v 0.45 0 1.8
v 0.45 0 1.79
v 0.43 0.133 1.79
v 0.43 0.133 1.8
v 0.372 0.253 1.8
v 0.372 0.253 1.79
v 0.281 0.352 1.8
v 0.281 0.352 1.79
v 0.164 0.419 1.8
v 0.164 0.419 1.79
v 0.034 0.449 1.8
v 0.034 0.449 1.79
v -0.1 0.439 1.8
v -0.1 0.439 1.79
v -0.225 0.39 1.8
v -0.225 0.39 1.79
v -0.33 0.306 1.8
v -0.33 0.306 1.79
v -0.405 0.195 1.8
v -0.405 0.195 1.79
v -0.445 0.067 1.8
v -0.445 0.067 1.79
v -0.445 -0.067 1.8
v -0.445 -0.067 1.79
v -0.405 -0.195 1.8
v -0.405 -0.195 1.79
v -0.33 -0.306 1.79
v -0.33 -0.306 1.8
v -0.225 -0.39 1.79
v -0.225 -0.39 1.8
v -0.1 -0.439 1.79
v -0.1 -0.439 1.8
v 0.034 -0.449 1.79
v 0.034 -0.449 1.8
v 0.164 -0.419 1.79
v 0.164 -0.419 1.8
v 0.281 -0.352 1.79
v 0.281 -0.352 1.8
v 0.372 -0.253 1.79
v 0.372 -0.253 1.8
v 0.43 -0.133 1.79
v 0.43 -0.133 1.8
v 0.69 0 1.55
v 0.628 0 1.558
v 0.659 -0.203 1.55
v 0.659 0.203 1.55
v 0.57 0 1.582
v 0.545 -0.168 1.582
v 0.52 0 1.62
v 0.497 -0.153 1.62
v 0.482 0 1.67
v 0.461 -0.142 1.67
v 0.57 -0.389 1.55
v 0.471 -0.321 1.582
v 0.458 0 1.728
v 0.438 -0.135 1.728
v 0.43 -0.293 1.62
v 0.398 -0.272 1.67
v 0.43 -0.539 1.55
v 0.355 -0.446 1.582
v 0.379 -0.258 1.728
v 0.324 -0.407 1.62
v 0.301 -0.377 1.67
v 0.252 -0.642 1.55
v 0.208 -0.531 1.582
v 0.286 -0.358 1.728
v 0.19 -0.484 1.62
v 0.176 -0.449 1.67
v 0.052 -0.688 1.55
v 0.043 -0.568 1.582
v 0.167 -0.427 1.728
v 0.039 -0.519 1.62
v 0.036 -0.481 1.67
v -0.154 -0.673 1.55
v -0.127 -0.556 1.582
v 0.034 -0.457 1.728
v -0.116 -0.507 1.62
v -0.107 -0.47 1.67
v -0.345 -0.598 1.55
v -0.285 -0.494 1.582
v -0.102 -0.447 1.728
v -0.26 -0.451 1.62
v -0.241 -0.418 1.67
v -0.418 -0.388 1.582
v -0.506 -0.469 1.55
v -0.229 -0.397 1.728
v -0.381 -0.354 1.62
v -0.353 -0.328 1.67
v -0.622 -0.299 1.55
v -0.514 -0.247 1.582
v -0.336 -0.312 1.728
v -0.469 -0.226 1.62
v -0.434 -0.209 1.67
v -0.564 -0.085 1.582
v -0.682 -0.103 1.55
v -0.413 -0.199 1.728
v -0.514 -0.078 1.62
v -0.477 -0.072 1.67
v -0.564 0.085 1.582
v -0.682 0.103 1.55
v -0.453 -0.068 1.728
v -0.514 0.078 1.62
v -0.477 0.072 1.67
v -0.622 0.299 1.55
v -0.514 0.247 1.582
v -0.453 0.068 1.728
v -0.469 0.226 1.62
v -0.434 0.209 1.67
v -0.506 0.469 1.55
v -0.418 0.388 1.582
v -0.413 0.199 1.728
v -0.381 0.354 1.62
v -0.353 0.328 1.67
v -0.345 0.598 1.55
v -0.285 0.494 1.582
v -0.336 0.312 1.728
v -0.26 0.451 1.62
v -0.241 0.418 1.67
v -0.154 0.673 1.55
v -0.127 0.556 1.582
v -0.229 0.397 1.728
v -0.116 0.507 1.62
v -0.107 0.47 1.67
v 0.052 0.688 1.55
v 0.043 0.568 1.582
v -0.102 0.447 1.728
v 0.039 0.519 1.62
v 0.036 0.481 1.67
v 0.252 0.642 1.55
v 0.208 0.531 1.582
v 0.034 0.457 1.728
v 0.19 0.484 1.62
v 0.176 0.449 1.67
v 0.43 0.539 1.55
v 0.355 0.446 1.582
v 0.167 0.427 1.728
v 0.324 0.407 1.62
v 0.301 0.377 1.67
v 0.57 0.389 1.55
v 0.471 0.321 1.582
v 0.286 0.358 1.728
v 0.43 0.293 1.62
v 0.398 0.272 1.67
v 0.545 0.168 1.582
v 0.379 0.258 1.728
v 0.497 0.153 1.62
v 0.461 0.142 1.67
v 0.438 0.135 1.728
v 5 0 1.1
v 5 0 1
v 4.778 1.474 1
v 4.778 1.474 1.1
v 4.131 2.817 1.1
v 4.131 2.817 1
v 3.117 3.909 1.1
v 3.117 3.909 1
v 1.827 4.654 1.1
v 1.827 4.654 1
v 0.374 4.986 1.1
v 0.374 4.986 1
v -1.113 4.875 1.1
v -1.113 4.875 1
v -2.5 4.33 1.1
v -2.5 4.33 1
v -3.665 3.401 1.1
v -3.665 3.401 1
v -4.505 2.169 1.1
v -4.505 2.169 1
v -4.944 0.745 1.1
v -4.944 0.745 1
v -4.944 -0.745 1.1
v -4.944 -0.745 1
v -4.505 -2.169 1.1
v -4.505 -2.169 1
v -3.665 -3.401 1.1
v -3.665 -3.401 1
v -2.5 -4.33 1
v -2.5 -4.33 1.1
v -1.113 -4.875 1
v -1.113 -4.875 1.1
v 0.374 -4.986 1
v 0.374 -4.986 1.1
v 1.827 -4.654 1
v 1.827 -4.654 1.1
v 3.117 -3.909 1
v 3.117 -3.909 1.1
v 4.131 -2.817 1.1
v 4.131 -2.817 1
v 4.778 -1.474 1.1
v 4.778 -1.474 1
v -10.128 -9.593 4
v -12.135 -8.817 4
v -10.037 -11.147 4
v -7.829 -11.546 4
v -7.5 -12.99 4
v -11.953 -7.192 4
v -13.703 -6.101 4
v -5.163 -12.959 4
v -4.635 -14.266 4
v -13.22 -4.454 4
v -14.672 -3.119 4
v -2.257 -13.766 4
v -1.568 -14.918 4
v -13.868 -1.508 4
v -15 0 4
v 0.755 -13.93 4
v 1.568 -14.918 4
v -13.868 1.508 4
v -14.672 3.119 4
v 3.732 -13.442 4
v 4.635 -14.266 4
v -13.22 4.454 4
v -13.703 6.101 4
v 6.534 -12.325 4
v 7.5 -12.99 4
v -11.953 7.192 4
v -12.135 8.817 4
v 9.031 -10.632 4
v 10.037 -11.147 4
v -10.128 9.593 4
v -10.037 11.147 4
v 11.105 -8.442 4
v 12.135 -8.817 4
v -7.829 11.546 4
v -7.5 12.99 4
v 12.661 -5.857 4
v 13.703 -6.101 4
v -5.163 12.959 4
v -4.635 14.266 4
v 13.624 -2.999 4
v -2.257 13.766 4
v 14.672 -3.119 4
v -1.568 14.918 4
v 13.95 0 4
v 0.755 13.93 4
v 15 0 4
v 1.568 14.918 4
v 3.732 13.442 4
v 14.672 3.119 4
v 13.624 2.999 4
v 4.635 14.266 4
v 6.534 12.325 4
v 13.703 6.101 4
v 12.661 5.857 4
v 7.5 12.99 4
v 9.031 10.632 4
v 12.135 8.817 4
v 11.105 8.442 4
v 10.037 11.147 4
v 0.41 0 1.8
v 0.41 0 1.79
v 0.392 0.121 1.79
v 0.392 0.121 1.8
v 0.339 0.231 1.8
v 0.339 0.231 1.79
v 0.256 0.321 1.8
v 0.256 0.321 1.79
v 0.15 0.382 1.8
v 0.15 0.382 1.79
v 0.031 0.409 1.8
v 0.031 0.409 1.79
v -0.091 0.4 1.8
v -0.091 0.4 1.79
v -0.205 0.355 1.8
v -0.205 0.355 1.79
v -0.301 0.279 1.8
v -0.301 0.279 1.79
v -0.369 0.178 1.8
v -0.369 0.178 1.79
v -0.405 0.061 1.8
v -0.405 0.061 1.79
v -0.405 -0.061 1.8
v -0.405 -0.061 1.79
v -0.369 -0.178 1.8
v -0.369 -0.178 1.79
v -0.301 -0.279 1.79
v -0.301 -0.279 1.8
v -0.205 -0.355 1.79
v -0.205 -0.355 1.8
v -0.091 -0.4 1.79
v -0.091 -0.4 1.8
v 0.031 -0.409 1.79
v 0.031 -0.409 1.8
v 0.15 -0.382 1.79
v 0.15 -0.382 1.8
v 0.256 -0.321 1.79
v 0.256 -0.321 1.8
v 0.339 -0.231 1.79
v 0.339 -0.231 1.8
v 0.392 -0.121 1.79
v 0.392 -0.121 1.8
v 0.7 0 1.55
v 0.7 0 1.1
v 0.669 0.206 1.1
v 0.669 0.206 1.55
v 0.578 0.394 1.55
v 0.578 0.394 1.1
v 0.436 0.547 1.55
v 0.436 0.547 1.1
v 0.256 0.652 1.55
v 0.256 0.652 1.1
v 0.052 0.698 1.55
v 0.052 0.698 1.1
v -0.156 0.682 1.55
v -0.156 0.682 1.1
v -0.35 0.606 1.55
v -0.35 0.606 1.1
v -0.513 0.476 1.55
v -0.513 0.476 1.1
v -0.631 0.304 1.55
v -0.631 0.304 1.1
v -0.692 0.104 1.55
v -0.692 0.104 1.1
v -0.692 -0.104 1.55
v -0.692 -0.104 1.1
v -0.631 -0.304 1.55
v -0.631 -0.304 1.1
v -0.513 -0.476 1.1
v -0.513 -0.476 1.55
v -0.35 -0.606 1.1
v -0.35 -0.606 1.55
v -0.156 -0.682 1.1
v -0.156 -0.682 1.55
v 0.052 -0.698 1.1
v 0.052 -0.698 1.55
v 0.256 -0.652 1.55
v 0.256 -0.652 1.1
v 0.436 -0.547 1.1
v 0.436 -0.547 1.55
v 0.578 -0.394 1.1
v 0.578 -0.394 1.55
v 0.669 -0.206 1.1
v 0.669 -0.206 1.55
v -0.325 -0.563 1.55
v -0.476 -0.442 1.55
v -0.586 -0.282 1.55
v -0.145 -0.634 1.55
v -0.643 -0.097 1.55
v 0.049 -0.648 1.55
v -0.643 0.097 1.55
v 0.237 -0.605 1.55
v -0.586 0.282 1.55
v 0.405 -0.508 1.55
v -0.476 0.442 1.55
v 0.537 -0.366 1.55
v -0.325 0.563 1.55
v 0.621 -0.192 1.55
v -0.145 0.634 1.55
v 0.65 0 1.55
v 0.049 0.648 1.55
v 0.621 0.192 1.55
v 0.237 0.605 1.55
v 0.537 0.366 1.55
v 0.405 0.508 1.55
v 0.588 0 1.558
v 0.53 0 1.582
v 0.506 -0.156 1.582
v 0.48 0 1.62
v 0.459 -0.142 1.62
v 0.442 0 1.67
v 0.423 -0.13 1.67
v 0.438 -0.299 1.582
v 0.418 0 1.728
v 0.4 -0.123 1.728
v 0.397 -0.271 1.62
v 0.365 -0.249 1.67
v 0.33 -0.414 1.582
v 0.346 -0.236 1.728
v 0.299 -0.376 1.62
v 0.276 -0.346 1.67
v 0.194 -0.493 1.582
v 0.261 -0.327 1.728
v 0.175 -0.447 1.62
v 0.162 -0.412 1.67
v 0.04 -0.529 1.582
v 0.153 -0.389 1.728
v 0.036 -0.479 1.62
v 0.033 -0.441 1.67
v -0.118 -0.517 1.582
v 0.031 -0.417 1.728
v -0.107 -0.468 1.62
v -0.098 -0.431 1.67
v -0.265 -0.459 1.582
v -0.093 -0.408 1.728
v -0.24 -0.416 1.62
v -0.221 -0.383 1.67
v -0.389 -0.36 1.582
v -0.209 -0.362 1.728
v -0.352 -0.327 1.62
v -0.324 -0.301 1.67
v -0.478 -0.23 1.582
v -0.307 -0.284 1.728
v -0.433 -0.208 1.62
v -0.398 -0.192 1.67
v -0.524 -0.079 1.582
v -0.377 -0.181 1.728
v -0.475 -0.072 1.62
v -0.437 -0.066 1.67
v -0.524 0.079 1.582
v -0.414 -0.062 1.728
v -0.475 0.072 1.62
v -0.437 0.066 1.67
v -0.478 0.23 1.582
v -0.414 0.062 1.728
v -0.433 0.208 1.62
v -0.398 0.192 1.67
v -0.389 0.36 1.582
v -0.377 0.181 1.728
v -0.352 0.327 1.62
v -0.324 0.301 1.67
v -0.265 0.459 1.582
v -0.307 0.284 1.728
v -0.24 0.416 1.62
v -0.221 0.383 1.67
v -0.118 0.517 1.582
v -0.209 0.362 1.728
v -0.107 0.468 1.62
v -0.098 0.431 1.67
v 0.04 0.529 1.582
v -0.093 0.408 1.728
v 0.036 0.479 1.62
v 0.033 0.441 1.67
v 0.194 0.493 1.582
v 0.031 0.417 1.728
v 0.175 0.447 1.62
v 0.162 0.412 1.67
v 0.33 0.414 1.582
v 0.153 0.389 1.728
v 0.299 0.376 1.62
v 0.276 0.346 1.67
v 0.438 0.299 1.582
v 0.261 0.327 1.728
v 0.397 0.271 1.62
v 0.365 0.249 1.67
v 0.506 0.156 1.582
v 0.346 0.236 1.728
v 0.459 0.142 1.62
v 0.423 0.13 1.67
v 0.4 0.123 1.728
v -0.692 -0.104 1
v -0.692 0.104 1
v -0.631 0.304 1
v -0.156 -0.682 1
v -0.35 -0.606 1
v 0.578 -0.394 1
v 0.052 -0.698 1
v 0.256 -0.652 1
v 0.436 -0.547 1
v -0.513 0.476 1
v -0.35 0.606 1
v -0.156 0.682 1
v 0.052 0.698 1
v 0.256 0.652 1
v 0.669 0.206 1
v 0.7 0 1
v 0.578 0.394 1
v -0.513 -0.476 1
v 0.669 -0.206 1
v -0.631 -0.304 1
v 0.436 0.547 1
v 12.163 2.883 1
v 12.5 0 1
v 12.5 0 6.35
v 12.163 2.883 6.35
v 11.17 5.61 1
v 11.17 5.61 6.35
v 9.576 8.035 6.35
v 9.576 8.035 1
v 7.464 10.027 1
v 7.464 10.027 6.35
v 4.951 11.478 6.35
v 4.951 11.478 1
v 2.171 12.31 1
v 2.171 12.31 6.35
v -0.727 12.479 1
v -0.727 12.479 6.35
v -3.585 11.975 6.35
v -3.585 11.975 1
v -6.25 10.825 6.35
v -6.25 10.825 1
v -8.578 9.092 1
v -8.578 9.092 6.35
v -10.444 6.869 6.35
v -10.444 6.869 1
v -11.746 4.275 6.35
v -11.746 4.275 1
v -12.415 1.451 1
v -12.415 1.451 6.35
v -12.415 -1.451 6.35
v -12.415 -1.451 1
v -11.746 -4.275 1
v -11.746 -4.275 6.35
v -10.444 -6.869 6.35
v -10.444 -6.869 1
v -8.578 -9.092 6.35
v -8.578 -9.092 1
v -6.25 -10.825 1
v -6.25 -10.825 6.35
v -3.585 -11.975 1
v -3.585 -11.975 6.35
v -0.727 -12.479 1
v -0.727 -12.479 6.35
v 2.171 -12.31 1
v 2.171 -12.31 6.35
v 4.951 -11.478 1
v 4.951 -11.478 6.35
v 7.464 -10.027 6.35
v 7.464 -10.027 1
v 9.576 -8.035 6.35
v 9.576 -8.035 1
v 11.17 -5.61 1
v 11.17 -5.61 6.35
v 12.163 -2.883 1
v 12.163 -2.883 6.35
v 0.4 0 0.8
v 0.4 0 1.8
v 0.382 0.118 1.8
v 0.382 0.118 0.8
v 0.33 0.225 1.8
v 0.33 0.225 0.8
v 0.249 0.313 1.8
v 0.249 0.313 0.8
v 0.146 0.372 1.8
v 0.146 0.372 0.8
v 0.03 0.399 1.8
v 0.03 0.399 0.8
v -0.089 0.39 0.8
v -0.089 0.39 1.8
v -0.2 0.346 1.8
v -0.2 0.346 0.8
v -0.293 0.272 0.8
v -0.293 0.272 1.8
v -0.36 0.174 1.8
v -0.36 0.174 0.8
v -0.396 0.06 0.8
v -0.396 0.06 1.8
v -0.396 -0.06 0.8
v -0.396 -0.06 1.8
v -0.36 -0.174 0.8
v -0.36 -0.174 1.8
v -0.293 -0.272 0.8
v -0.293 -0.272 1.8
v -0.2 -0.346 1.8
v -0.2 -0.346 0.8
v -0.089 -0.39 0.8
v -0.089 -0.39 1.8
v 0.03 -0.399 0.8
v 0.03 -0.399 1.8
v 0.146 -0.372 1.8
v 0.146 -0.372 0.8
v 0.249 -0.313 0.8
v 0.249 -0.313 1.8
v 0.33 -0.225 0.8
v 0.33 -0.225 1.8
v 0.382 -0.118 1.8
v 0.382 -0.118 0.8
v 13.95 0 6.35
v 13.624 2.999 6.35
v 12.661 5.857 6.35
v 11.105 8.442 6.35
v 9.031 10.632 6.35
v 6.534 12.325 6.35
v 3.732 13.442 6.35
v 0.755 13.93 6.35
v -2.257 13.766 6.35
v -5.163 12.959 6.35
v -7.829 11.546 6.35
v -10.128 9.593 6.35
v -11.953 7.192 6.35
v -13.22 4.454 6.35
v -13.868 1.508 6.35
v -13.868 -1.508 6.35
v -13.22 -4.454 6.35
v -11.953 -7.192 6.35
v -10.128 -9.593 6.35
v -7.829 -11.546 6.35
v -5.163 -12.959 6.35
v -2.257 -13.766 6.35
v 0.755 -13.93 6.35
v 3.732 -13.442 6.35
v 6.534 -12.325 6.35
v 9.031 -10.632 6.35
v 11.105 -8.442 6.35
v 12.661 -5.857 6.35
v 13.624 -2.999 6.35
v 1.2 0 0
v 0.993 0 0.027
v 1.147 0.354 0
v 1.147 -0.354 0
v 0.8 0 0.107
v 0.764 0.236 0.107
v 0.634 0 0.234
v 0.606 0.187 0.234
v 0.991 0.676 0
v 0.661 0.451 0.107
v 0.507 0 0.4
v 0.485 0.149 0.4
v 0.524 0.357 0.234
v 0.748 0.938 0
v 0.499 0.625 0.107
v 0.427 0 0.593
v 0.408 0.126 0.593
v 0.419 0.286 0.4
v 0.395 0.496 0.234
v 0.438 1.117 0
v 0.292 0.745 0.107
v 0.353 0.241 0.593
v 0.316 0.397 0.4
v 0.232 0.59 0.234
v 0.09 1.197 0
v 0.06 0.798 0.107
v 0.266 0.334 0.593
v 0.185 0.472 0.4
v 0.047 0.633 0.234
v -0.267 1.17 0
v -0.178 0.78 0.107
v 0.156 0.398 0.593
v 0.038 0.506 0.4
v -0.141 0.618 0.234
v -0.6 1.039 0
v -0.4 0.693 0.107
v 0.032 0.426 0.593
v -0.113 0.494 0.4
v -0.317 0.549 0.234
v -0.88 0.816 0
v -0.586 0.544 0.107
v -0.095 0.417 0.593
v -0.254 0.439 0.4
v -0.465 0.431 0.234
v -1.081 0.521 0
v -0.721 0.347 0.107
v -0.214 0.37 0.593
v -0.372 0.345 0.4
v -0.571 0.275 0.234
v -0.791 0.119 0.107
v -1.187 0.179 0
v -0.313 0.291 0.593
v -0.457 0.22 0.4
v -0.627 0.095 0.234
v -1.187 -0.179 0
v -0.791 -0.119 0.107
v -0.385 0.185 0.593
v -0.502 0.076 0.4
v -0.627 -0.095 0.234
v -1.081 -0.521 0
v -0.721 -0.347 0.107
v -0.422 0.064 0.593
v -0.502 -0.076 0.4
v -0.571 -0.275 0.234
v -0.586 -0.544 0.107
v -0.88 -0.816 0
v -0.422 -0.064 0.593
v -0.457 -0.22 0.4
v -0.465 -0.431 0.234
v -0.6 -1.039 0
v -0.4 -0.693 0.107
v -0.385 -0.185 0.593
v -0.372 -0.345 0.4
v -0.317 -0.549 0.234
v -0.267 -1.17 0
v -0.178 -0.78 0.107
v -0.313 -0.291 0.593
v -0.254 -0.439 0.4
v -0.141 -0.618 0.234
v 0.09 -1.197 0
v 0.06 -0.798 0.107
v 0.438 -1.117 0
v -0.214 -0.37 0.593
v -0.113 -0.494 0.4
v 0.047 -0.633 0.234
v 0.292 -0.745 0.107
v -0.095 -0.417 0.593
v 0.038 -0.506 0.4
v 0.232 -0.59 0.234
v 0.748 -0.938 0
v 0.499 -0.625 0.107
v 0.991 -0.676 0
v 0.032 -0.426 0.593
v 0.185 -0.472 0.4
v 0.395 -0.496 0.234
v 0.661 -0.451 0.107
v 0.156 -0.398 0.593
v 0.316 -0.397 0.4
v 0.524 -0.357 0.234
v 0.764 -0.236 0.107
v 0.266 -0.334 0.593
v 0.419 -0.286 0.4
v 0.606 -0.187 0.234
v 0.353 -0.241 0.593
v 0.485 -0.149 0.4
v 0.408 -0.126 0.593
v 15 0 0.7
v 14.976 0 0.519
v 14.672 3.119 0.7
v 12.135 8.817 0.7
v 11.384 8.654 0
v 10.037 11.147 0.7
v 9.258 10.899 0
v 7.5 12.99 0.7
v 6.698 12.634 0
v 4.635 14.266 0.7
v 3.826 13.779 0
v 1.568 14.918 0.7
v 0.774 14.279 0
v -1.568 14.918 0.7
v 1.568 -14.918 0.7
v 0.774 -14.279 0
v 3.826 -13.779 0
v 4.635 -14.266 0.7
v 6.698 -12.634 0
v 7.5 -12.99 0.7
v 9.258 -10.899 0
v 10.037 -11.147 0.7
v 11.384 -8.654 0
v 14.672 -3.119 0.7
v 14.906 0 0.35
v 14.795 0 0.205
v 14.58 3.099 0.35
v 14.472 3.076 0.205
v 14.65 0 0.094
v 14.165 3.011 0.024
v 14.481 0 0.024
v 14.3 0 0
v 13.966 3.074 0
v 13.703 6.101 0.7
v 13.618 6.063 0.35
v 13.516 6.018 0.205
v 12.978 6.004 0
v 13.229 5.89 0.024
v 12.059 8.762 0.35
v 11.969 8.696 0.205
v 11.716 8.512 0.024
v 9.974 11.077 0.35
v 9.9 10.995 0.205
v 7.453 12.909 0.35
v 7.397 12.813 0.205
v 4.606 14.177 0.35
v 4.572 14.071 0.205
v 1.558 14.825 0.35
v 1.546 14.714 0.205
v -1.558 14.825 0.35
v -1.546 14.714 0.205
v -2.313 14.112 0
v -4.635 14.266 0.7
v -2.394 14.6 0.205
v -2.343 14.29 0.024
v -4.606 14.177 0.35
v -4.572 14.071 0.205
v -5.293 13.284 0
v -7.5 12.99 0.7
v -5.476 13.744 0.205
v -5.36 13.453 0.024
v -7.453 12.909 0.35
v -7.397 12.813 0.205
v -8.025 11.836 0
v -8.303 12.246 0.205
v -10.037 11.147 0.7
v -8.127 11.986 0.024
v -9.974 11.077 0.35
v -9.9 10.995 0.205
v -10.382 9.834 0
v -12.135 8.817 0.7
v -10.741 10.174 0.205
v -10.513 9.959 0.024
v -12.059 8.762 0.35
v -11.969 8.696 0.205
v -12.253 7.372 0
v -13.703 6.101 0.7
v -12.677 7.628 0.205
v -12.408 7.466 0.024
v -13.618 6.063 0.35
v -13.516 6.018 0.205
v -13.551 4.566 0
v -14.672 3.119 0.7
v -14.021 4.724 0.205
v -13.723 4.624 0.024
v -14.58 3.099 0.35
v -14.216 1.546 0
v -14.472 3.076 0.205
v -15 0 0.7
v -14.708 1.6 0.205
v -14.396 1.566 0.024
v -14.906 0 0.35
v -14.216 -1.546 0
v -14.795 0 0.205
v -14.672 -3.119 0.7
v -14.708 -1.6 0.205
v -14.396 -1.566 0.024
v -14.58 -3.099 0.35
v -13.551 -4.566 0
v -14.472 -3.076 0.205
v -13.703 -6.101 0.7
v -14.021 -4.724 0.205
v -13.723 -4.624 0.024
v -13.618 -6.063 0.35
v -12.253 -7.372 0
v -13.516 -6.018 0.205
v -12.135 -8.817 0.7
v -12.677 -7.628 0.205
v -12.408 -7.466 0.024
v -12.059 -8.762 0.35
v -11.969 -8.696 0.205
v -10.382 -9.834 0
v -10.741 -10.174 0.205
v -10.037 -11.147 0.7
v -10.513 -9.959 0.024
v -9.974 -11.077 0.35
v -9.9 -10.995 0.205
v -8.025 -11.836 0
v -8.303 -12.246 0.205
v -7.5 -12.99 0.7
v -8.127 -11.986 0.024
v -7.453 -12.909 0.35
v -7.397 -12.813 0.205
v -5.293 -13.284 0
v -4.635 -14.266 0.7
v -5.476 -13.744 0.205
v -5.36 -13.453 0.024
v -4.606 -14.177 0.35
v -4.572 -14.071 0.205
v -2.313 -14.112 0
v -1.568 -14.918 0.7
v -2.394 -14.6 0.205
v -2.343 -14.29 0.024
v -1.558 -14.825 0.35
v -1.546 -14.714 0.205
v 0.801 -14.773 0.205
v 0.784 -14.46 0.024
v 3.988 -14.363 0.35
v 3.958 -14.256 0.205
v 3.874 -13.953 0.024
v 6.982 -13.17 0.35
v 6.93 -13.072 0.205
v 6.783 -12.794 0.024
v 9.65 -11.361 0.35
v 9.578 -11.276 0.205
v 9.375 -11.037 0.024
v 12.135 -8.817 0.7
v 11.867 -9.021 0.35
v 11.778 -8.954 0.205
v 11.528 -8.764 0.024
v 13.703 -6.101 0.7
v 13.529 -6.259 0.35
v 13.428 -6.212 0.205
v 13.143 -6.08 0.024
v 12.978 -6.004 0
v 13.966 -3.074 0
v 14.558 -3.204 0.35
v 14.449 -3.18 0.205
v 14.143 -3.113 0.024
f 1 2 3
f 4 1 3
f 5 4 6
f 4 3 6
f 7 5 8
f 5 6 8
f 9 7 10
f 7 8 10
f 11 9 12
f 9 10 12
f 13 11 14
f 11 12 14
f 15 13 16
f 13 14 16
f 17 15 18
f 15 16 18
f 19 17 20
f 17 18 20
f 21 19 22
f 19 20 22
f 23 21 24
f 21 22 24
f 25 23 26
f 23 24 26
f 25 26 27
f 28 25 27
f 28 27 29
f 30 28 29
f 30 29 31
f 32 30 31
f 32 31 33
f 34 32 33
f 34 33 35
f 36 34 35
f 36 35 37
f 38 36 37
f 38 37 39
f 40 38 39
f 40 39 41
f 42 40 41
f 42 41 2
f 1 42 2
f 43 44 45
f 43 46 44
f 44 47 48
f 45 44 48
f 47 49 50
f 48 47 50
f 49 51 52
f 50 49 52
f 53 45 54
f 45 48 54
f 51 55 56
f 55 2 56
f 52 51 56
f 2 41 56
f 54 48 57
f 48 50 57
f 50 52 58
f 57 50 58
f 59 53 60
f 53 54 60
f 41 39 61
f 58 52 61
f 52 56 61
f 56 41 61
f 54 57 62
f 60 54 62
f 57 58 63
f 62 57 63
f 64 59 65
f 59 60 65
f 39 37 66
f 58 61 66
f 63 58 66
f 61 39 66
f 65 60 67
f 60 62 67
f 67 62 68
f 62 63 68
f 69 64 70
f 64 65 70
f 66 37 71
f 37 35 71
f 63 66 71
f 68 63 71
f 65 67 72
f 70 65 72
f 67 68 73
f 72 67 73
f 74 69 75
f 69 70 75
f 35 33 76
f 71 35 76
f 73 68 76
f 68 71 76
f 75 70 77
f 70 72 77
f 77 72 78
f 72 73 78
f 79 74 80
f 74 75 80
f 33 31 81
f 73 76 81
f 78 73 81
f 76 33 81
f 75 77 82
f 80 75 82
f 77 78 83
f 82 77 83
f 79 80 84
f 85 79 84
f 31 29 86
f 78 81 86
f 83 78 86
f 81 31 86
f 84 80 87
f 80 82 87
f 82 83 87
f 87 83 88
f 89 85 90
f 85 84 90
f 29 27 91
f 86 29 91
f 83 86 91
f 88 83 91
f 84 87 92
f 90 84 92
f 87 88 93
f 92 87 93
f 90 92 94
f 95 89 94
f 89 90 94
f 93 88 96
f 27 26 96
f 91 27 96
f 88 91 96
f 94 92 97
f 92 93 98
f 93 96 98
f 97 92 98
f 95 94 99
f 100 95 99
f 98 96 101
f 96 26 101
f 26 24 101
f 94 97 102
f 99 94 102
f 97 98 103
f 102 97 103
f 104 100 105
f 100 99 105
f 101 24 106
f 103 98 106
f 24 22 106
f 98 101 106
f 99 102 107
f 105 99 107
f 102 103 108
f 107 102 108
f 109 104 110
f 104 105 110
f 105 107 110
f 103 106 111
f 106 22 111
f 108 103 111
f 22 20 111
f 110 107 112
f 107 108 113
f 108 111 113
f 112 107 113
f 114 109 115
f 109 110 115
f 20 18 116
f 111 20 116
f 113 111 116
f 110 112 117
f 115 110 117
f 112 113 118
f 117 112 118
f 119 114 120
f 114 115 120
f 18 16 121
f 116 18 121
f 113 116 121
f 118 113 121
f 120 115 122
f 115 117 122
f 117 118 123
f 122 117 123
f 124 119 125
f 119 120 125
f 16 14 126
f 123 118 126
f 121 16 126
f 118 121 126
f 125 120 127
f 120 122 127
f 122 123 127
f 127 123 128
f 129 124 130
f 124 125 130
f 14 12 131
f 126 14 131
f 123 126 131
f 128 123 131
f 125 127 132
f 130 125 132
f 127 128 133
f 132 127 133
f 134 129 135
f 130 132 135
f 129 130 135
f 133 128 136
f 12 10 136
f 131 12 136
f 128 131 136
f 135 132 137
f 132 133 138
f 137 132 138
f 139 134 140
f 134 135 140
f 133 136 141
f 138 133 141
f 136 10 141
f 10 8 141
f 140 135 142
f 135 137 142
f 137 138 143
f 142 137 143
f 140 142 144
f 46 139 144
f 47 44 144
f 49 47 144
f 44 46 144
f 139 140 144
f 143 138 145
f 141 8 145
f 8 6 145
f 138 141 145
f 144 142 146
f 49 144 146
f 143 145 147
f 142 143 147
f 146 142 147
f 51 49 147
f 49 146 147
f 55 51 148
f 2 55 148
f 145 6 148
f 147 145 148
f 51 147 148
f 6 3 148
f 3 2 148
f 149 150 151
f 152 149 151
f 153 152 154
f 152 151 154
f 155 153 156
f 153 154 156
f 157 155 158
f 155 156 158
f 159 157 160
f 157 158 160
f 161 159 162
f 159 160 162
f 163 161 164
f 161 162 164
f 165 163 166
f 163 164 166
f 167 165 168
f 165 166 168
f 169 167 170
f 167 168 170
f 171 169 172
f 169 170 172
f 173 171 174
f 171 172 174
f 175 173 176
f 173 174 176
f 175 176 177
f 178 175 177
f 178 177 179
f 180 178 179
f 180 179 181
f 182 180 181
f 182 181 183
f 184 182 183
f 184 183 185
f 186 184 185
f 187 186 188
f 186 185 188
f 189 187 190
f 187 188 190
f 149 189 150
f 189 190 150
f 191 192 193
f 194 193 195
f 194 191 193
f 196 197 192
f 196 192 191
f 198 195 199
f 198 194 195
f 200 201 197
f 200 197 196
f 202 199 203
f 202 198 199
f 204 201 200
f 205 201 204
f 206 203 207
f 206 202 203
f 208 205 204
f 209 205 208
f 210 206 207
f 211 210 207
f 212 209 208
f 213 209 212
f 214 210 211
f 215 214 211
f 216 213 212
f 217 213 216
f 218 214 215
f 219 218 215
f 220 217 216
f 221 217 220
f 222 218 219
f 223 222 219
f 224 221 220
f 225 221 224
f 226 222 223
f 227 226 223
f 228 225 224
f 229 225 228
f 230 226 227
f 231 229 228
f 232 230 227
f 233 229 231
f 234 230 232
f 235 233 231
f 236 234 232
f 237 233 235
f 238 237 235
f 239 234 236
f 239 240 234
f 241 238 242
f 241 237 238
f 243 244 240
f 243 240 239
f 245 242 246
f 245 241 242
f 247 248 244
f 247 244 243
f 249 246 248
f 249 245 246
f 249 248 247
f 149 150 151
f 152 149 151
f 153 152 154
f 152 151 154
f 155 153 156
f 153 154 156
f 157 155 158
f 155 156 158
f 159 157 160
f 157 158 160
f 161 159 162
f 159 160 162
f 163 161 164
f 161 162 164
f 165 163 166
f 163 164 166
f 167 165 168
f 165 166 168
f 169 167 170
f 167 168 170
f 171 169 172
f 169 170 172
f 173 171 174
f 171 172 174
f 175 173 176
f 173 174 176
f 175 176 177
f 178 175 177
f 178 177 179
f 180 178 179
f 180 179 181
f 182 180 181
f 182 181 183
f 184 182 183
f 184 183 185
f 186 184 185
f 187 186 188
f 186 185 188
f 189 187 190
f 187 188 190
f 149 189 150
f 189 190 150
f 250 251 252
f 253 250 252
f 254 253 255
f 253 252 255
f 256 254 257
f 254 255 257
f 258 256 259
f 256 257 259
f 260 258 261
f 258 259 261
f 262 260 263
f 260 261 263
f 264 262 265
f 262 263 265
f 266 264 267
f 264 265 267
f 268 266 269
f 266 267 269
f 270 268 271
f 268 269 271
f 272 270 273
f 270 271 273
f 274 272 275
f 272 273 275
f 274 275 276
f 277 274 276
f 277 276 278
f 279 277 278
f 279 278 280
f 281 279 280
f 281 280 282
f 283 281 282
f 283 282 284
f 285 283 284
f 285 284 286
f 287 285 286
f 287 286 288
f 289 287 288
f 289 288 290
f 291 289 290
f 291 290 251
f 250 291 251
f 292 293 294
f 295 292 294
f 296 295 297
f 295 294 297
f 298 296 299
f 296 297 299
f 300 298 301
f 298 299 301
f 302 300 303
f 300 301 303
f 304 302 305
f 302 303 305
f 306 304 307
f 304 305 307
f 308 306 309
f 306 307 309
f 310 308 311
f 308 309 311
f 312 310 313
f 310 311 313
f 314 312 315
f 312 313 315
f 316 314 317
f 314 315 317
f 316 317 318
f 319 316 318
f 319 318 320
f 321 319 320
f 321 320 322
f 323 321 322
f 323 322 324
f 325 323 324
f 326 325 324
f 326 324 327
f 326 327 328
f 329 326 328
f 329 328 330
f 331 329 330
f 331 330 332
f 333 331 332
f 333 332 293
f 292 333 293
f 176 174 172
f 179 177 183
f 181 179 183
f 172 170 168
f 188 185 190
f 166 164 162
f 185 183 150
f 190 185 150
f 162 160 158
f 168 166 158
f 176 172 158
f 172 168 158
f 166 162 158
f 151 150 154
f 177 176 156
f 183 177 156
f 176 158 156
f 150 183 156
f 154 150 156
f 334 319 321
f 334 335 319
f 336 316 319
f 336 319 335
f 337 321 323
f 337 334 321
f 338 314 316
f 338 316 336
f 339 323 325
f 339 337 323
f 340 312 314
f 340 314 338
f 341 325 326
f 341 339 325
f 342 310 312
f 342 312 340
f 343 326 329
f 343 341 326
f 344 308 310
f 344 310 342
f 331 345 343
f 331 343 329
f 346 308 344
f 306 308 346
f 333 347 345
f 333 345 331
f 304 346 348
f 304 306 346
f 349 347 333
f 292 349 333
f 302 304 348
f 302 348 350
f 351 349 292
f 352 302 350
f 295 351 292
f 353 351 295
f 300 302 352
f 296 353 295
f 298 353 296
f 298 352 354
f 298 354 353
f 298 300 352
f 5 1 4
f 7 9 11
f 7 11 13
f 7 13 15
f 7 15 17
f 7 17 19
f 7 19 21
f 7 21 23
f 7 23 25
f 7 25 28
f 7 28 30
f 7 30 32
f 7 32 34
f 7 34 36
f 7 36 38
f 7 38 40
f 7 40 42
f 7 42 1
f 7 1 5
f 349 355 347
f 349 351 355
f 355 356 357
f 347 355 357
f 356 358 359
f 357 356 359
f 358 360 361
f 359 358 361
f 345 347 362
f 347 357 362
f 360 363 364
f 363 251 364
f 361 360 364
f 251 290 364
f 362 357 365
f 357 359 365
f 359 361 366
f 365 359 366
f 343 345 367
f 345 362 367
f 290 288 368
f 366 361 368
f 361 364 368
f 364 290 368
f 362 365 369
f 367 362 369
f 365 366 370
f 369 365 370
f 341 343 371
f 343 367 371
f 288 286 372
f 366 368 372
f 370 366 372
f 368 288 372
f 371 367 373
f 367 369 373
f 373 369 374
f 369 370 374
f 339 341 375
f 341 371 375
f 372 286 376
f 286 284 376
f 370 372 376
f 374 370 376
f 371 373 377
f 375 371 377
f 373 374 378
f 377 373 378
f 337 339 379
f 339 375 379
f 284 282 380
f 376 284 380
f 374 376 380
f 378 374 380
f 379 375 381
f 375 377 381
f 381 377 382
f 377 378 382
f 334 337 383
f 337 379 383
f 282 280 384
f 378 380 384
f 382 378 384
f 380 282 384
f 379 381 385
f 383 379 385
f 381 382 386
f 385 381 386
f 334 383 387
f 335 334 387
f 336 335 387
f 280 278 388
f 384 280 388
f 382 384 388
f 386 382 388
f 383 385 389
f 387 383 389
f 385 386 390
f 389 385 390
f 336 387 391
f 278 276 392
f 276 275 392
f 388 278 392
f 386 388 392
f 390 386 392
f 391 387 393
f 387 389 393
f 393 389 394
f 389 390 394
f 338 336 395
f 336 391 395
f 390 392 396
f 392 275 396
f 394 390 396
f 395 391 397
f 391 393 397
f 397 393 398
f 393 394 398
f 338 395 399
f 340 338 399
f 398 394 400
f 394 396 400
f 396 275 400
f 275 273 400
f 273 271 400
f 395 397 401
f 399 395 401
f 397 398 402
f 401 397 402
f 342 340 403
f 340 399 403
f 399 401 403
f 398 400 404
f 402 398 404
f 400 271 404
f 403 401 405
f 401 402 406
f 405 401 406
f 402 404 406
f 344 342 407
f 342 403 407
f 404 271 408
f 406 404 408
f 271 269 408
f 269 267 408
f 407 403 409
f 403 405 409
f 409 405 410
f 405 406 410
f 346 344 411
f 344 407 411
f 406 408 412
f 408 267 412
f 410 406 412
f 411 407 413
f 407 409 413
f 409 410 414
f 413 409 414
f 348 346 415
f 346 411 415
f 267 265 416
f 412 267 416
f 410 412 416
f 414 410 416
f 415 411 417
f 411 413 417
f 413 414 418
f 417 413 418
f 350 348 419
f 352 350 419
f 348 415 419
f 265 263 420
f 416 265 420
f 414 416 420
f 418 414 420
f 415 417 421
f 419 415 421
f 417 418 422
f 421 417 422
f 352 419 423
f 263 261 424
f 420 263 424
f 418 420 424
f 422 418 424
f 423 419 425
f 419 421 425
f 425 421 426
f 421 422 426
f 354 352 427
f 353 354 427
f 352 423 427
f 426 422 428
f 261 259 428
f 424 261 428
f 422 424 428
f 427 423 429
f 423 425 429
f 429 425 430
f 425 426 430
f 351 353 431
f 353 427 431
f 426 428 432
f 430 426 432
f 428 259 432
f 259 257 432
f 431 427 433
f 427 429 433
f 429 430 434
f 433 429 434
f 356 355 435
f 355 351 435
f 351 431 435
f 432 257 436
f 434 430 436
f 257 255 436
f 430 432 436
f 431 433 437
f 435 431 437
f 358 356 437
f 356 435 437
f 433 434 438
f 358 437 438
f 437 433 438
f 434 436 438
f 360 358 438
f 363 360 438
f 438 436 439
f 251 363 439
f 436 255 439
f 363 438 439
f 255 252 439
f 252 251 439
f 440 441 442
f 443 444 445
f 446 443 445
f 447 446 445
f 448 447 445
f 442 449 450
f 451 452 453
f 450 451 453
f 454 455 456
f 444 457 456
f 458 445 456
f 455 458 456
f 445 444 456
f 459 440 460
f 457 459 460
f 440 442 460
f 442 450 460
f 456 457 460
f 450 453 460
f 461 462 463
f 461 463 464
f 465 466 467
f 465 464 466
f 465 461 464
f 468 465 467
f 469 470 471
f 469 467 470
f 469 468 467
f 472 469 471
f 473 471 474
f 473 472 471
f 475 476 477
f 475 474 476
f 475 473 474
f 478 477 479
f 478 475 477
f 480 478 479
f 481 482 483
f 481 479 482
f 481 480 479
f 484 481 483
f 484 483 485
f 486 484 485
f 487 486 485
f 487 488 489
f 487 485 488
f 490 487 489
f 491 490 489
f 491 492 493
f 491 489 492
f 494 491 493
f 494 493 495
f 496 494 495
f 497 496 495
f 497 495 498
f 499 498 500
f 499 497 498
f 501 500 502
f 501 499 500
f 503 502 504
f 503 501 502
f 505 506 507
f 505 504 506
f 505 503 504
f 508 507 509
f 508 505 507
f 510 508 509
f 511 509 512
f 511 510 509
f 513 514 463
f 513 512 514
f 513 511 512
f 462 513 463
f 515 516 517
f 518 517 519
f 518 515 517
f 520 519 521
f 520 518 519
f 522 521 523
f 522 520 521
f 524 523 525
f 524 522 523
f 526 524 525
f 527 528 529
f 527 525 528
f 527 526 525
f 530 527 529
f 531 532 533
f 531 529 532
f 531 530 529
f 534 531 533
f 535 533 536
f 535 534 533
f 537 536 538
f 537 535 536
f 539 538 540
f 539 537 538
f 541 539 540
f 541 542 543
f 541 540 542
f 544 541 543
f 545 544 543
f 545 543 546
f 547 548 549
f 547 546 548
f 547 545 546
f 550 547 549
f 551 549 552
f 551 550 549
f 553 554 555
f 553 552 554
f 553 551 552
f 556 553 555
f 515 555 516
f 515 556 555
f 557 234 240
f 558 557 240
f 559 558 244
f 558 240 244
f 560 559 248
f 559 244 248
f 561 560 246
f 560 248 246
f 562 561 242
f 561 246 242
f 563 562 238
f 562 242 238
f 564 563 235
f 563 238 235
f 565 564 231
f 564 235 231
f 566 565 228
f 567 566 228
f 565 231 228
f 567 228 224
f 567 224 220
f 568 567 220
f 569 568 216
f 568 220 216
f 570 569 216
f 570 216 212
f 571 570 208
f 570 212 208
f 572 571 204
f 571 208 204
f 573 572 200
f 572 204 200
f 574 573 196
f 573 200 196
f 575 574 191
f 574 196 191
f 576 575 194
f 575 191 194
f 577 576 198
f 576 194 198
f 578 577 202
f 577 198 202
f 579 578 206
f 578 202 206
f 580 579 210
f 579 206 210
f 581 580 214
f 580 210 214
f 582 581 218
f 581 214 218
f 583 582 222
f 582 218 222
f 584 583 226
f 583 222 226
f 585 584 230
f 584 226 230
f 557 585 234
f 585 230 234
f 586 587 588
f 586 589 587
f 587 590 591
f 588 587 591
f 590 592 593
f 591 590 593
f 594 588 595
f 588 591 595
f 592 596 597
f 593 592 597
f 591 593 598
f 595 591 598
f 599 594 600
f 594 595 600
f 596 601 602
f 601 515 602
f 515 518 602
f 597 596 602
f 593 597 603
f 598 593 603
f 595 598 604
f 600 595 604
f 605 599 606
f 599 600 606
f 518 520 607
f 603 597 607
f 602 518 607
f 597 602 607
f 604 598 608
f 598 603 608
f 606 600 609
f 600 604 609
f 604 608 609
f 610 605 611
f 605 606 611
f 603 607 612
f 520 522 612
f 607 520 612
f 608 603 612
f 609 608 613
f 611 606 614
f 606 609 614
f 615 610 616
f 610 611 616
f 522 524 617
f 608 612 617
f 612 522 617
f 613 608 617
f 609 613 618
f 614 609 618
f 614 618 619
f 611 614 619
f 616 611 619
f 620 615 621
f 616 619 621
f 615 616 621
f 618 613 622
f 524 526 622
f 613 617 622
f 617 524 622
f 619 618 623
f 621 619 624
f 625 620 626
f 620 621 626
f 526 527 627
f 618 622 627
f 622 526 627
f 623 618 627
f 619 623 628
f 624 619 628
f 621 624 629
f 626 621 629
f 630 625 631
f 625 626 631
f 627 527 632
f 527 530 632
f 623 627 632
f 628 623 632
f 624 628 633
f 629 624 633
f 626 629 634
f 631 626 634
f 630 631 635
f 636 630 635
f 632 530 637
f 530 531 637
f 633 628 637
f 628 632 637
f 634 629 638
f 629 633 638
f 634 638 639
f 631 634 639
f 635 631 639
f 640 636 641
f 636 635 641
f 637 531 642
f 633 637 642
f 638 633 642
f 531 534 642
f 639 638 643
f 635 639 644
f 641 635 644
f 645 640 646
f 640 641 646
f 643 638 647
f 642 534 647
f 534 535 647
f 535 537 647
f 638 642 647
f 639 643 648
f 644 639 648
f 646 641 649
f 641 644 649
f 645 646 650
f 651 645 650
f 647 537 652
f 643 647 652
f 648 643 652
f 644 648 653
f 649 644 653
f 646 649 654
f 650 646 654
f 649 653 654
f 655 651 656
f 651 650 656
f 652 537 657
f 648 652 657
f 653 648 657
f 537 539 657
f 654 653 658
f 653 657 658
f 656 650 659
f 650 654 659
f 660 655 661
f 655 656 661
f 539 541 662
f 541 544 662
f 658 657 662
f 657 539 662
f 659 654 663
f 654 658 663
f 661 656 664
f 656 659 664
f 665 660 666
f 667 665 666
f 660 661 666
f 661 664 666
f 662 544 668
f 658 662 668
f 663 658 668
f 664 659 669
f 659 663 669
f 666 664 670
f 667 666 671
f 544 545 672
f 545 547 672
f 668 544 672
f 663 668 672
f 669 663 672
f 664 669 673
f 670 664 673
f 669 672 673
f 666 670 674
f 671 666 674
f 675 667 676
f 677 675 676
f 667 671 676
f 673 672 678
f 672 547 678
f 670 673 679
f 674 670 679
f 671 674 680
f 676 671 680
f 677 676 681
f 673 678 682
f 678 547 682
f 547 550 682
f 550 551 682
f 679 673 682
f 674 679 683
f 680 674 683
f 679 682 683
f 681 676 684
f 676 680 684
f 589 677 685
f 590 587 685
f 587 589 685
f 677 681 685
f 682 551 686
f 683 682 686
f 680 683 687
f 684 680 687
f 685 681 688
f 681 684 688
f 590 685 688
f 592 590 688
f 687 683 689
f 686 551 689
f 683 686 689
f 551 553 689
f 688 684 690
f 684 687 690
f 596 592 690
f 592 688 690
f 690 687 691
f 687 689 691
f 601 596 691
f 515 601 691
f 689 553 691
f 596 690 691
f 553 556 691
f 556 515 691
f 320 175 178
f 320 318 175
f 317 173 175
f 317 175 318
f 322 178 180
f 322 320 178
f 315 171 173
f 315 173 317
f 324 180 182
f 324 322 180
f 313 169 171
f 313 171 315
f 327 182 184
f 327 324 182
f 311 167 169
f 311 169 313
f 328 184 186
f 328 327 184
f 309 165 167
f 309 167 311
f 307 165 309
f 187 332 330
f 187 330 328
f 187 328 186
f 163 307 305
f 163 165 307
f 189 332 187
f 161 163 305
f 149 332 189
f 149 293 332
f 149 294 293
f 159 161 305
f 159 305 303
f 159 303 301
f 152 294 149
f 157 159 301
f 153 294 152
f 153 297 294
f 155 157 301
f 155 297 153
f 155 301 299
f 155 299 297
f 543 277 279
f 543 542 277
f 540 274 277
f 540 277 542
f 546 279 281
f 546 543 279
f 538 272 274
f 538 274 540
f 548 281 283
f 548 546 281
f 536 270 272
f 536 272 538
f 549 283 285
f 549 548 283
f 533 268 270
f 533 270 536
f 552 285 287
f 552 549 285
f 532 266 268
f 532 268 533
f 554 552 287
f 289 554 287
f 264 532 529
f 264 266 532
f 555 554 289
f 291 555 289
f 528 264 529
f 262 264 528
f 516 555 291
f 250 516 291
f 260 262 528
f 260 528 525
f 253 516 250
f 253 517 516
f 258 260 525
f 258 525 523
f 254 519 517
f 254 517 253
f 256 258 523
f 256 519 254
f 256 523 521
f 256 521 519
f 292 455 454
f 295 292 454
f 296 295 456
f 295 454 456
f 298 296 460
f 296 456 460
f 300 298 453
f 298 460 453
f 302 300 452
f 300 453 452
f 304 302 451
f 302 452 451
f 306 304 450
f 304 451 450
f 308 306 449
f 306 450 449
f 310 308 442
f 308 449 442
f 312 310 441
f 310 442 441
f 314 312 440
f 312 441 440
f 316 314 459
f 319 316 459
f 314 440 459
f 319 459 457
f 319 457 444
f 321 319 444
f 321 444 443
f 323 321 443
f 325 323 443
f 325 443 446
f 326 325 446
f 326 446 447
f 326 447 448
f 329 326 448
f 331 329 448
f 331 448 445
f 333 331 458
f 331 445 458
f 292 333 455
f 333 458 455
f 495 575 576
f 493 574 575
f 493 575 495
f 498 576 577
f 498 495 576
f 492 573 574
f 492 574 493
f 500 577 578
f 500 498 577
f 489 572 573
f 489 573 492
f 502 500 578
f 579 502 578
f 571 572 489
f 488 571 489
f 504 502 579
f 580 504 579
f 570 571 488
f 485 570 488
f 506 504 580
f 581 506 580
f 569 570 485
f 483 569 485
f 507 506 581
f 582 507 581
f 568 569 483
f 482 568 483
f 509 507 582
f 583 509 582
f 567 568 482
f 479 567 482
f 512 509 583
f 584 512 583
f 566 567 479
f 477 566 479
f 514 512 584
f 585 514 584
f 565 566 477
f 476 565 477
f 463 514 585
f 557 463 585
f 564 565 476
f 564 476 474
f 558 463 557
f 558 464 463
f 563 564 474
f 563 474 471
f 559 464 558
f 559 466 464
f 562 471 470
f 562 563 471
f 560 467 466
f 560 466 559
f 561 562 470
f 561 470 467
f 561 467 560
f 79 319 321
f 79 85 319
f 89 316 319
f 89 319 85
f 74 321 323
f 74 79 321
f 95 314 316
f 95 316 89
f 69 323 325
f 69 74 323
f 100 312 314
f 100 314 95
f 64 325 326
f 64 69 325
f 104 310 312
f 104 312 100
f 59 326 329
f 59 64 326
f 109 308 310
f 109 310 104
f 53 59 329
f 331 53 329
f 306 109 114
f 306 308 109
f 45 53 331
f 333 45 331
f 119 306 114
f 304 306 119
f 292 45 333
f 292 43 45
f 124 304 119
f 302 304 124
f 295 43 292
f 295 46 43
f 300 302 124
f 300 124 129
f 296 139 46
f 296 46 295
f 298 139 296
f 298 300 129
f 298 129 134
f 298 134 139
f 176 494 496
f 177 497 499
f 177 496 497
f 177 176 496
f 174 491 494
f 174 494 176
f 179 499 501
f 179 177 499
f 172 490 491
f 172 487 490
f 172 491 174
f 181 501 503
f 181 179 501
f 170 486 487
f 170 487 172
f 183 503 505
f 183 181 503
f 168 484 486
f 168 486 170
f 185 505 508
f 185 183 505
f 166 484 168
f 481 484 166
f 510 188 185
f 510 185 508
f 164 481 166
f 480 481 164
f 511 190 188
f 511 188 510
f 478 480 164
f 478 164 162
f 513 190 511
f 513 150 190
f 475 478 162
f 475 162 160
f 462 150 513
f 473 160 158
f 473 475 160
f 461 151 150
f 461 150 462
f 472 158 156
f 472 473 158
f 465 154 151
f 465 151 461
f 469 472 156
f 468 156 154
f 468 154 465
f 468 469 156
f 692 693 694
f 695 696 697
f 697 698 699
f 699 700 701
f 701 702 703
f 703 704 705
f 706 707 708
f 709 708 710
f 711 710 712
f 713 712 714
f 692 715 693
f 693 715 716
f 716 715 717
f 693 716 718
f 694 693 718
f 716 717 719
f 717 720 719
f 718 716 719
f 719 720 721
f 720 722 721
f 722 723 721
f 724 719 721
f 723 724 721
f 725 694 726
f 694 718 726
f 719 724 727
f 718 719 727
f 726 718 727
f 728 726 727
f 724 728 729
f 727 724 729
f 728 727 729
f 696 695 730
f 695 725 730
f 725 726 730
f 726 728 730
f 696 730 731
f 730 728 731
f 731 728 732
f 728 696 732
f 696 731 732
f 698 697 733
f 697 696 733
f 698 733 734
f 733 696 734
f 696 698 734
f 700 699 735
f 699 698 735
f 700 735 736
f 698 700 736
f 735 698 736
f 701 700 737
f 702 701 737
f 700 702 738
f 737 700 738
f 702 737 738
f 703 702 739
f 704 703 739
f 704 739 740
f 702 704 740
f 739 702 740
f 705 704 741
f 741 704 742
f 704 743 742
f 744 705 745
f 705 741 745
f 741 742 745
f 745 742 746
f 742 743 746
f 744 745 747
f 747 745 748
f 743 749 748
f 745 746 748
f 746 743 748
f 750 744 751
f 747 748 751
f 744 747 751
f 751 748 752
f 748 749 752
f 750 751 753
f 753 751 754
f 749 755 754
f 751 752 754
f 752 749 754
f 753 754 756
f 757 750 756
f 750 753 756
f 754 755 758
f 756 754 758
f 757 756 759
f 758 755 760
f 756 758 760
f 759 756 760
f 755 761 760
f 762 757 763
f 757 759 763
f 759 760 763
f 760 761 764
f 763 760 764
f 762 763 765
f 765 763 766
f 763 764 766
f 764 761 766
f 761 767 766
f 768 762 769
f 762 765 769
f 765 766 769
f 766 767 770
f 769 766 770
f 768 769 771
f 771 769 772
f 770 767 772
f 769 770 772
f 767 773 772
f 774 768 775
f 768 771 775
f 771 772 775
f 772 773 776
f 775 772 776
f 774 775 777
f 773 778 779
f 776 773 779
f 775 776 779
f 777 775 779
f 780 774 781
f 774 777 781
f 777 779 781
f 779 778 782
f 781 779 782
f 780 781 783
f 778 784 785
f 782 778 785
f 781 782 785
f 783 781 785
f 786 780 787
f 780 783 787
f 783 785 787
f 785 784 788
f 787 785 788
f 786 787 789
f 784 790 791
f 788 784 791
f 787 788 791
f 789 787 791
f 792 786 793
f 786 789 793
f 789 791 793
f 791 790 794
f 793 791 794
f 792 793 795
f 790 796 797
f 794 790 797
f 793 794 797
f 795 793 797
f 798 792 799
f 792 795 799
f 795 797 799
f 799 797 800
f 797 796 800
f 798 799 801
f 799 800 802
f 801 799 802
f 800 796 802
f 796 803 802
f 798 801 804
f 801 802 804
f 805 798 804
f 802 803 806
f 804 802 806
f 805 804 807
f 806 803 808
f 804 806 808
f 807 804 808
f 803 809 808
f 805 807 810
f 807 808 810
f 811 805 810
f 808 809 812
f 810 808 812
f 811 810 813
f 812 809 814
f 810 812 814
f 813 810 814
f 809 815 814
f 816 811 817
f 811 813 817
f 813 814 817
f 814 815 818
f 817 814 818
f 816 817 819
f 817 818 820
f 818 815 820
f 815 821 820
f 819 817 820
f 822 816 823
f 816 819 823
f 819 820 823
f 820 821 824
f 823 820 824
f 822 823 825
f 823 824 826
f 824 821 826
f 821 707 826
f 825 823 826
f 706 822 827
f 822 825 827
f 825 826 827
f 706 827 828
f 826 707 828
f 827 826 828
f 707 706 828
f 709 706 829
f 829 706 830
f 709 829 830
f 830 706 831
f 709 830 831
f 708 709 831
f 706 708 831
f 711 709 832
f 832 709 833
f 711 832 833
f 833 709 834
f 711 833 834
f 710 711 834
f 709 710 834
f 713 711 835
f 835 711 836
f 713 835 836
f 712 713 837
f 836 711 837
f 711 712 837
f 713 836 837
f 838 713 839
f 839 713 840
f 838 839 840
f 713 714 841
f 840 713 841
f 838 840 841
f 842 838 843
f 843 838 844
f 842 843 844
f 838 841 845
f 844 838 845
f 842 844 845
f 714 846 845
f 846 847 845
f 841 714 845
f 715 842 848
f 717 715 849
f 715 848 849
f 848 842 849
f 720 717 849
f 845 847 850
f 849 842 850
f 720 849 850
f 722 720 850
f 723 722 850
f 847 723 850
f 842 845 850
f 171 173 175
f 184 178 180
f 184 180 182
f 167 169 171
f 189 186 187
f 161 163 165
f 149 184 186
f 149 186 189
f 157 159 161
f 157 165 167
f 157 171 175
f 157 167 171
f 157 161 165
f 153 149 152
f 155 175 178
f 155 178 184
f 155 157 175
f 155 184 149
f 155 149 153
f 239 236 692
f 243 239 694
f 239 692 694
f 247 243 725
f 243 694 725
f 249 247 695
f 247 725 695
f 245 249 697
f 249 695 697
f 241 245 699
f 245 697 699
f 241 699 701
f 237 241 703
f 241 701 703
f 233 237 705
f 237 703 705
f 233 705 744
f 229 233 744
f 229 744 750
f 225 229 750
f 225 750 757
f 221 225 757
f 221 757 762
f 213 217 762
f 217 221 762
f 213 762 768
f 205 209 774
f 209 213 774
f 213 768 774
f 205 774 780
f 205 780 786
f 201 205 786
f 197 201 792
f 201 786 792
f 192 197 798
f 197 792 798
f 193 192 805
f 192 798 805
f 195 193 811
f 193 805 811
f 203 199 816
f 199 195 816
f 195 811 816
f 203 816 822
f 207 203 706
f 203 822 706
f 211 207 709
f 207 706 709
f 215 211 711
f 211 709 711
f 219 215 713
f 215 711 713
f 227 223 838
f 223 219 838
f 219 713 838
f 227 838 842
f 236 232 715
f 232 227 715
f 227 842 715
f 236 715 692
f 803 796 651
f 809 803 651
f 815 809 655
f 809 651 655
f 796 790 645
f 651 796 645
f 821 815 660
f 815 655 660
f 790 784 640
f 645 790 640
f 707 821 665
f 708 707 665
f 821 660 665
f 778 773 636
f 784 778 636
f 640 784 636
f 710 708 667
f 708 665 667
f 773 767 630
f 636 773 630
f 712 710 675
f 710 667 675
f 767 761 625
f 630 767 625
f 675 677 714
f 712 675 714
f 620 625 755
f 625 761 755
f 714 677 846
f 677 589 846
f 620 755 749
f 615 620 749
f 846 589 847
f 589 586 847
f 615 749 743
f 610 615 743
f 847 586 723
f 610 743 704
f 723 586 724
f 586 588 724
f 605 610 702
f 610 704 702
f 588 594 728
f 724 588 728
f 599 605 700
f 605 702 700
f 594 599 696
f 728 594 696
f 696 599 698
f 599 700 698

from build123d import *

# Parameters (mm, degrees)
CYLINDER012_R     = 0.45
CYLINDER012_DEPTH = 0.8
CYLINDER003_R     = 0.7
CYLINDER003_DEPTH = 0.55
FILLET003_R       = 0.24
CYLINDER013_R     = 5
CYLINDER013_DEPTH = 0.1
CYLINDER010_R     = 12.5
CYLINDER010_DEPTH = 10
CYLINDER011_R     = 13.95
CYLINDER011_DEPTH = 2.35
CYLINDER009_R     = 14
CYLINDER009_DEPTH = 3
CYLINDER004_R     = 0.4
CYLINDER004_DEPTH = 2
CYLINDER016_R     = 0.4
CYLINDER016_DEPTH = 2
CYLINDER014_R     = 0.41
CYLINDER014_DEPTH = 0.8
CYLINDER015_R     = 0.7
CYLINDER015_DEPTH = 0.55
FILLET004_R       = 0.24
CYLINDER017_R     = 5
CYLINDER017_DEPTH = 0.1
CYLINDER008_R     = 16
CYLINDER008_DEPTH = 10
CYLINDER007_R     = 14
CYLINDER007_DEPTH = 7
CYLINDER006_R     = 14
CYLINDER006_DEPTH = 1
CYLINDER005_R     = 0.4
CYLINDER005_DEPTH = 1
CYLINDER001_R     = 12.6
CYLINDER001_DEPTH = 8
CYLINDER_R        = 15
CYLINDER_DEPTH    = 8
CYLINDER002_R     = 15
CYLINDER002_DEPTH = 1
FILLET_R          = 0.7
FILLET001_R       = 0.7
FILLET002_R       = 0.8


with BuildPart() as cylinder012:
    # Cylinder012 → Cylinder012 (new body)
    with BuildSketch(Plane.XY.offset(1)):
        Circle(CYLINDER012_R)
    extrude(amount=CYLINDER012_DEPTH)


with BuildPart() as fillet003:
    # Cylinder003 → Cylinder003 (new body)
    with BuildSketch(Plane.XY.offset(1)):
        Circle(CYLINDER003_R)
    extrude(amount=CYLINDER003_DEPTH)

    # Fusion003: union Cylinder012
    add(cylinder012.part)

    # Fillet003
    fillet003_edges = [fillet003.edges().sort_by_distance(p)[0] for p in [
        (-0.45, 0, 1.55),
    ]]
    fillet(fillet003_edges, radius=FILLET003_R)


with BuildPart() as cylinder013:
    # Cylinder013 → Cylinder013 (new body)
    with BuildSketch(Plane.XY.offset(1)):
        Circle(CYLINDER013_R)
    extrude(amount=CYLINDER013_DEPTH)


with BuildPart() as cylinder010:
    # Cylinder010 → Cylinder010 (new body)
    with BuildSketch(Plane.XY):
        Circle(CYLINDER010_R)
    extrude(amount=CYLINDER010_DEPTH)


with BuildPart() as cylinder011:
    # Cylinder011 → Cylinder011 (new body)
    with BuildSketch(Plane.XY.offset(4)):
        Circle(CYLINDER011_R)
    extrude(amount=CYLINDER011_DEPTH)


with BuildPart() as cut006:
    # Cylinder009 → Cylinder009 (new body)
    with BuildSketch(Plane.XY.offset(1)):
        Circle(CYLINDER009_R)
    extrude(amount=CYLINDER009_DEPTH)

    # Fusion002: union Cylinder011
    add(cylinder011.part)

    # Cut006: cut Cylinder010
    add(cylinder010.part, mode=Mode.SUBTRACT)


with BuildPart() as cylinder004:
    # Cylinder004 → Cylinder004 (new body)
    with BuildSketch(Plane.XY.offset(1)):
        Circle(CYLINDER004_R)
    extrude(amount=CYLINDER004_DEPTH)


with BuildPart() as cylinder016:
    # Cylinder016 → Cylinder016 (new body)
    with BuildSketch(Plane.XY.offset(1)):
        Circle(CYLINDER016_R)
    extrude(amount=CYLINDER016_DEPTH)


with BuildPart() as cylinder014:
    # Cylinder014 → Cylinder014 (new body)
    with BuildSketch(Plane.XY.offset(1)):
        Circle(CYLINDER014_R)
    extrude(amount=CYLINDER014_DEPTH)


with BuildPart() as fillet004:
    # Cylinder015 → Cylinder015 (new body)
    with BuildSketch(Plane.XY.offset(1)):
        Circle(CYLINDER015_R)
    extrude(amount=CYLINDER015_DEPTH)

    # Fusion001: union Cylinder014
    add(cylinder014.part)

    # Fillet004
    fillet004_edges = [fillet004.edges().sort_by_distance(p)[0] for p in [
        (-0.41, 0, 1.55),
    ]]
    fillet(fillet004_edges, radius=FILLET004_R)


with BuildPart() as cut010:
    # Cylinder017 → Cylinder017 (new body)
    with BuildSketch(Plane.XY.offset(1)):
        Circle(CYLINDER017_R)
    extrude(amount=CYLINDER017_DEPTH)

    # Fusion004: union Fillet004
    add(fillet004.part)

    # Cut009: cut Cylinder016
    add(cylinder016.part, mode=Mode.SUBTRACT)

    # Cut010: cut Cylinder004
    add(cylinder004.part, mode=Mode.SUBTRACT)


with BuildPart() as cylinder008:
    # Cylinder008 → Cylinder008 (new body)
    with BuildSketch(Plane.XY.offset(4)):
        Circle(CYLINDER008_R)
    extrude(amount=CYLINDER008_DEPTH)


with BuildPart() as cylinder007:
    # Cylinder007 → Cylinder007 (new body)
    with BuildSketch(Plane.XY.offset(1)):
        Circle(CYLINDER007_R)
    extrude(amount=CYLINDER007_DEPTH)


with BuildPart() as cylinder006:
    # Cylinder006 → Cylinder006 (new body)
    with BuildSketch(Plane.XY.offset(7)):
        Circle(CYLINDER006_R)
    extrude(amount=CYLINDER006_DEPTH)


with BuildPart() as cylinder005:
    # Cylinder005 → Cylinder005 (new body)
    with BuildSketch(Plane.XY):
        Circle(CYLINDER005_R)
    extrude(amount=CYLINDER005_DEPTH)


with BuildPart() as cylinder001:
    # Cylinder001 → Cylinder001 (new body)
    with BuildSketch(Plane.XY):
        Circle(CYLINDER001_R)
    extrude(amount=CYLINDER001_DEPTH)


with BuildPart() as cut:
    # Cylinder → Cylinder (new body)
    with BuildSketch(Plane.XY):
        Circle(CYLINDER_R)
    extrude(amount=CYLINDER_DEPTH)

    # Cut: cut Cylinder001
    add(cylinder001.part, mode=Mode.SUBTRACT)


with BuildPart() as fusion005:
    # Cylinder002 → Cylinder002 (new body)
    with BuildSketch(Plane.XY):
        Circle(CYLINDER002_R)
    extrude(amount=CYLINDER002_DEPTH)

    # Fusion: union Cut
    add(cut.part)

    # Cut001: cut Cylinder005
    add(cylinder005.part, mode=Mode.SUBTRACT)

    # Cut003: cut Cylinder006
    add(cylinder006.part, mode=Mode.SUBTRACT)

    # Fillet
    fillet_edges = [fusion005.edges().sort_by_distance(p)[0] for p in [
        (-15, 0, 8),
    ]]
    fillet(fillet_edges, radius=FILLET_R)

    # Fillet001
    fillet001_edges = [fusion005.edges().sort_by_distance(p)[0] for p in [
        (-15, 0, 0),
    ]]
    fillet(fillet001_edges, radius=FILLET001_R)

    # Fillet002
    fillet002_edges = [fusion005.edges().sort_by_distance(p)[0] for p in [
        (-0.4, 0, 0),
    ]]
    fillet(fillet002_edges, radius=FILLET002_R)

    # Cut004: cut Cylinder007
    add(cylinder007.part, mode=Mode.SUBTRACT)

    # Cut008: cut Cylinder008
    add(cylinder008.part, mode=Mode.SUBTRACT)

    # Fusion005: union Cut006, Cut010
    add(cut006.part)
    add(cut010.part)


solid = Compound([fillet003.part, cylinder013.part, fusion005.part])
